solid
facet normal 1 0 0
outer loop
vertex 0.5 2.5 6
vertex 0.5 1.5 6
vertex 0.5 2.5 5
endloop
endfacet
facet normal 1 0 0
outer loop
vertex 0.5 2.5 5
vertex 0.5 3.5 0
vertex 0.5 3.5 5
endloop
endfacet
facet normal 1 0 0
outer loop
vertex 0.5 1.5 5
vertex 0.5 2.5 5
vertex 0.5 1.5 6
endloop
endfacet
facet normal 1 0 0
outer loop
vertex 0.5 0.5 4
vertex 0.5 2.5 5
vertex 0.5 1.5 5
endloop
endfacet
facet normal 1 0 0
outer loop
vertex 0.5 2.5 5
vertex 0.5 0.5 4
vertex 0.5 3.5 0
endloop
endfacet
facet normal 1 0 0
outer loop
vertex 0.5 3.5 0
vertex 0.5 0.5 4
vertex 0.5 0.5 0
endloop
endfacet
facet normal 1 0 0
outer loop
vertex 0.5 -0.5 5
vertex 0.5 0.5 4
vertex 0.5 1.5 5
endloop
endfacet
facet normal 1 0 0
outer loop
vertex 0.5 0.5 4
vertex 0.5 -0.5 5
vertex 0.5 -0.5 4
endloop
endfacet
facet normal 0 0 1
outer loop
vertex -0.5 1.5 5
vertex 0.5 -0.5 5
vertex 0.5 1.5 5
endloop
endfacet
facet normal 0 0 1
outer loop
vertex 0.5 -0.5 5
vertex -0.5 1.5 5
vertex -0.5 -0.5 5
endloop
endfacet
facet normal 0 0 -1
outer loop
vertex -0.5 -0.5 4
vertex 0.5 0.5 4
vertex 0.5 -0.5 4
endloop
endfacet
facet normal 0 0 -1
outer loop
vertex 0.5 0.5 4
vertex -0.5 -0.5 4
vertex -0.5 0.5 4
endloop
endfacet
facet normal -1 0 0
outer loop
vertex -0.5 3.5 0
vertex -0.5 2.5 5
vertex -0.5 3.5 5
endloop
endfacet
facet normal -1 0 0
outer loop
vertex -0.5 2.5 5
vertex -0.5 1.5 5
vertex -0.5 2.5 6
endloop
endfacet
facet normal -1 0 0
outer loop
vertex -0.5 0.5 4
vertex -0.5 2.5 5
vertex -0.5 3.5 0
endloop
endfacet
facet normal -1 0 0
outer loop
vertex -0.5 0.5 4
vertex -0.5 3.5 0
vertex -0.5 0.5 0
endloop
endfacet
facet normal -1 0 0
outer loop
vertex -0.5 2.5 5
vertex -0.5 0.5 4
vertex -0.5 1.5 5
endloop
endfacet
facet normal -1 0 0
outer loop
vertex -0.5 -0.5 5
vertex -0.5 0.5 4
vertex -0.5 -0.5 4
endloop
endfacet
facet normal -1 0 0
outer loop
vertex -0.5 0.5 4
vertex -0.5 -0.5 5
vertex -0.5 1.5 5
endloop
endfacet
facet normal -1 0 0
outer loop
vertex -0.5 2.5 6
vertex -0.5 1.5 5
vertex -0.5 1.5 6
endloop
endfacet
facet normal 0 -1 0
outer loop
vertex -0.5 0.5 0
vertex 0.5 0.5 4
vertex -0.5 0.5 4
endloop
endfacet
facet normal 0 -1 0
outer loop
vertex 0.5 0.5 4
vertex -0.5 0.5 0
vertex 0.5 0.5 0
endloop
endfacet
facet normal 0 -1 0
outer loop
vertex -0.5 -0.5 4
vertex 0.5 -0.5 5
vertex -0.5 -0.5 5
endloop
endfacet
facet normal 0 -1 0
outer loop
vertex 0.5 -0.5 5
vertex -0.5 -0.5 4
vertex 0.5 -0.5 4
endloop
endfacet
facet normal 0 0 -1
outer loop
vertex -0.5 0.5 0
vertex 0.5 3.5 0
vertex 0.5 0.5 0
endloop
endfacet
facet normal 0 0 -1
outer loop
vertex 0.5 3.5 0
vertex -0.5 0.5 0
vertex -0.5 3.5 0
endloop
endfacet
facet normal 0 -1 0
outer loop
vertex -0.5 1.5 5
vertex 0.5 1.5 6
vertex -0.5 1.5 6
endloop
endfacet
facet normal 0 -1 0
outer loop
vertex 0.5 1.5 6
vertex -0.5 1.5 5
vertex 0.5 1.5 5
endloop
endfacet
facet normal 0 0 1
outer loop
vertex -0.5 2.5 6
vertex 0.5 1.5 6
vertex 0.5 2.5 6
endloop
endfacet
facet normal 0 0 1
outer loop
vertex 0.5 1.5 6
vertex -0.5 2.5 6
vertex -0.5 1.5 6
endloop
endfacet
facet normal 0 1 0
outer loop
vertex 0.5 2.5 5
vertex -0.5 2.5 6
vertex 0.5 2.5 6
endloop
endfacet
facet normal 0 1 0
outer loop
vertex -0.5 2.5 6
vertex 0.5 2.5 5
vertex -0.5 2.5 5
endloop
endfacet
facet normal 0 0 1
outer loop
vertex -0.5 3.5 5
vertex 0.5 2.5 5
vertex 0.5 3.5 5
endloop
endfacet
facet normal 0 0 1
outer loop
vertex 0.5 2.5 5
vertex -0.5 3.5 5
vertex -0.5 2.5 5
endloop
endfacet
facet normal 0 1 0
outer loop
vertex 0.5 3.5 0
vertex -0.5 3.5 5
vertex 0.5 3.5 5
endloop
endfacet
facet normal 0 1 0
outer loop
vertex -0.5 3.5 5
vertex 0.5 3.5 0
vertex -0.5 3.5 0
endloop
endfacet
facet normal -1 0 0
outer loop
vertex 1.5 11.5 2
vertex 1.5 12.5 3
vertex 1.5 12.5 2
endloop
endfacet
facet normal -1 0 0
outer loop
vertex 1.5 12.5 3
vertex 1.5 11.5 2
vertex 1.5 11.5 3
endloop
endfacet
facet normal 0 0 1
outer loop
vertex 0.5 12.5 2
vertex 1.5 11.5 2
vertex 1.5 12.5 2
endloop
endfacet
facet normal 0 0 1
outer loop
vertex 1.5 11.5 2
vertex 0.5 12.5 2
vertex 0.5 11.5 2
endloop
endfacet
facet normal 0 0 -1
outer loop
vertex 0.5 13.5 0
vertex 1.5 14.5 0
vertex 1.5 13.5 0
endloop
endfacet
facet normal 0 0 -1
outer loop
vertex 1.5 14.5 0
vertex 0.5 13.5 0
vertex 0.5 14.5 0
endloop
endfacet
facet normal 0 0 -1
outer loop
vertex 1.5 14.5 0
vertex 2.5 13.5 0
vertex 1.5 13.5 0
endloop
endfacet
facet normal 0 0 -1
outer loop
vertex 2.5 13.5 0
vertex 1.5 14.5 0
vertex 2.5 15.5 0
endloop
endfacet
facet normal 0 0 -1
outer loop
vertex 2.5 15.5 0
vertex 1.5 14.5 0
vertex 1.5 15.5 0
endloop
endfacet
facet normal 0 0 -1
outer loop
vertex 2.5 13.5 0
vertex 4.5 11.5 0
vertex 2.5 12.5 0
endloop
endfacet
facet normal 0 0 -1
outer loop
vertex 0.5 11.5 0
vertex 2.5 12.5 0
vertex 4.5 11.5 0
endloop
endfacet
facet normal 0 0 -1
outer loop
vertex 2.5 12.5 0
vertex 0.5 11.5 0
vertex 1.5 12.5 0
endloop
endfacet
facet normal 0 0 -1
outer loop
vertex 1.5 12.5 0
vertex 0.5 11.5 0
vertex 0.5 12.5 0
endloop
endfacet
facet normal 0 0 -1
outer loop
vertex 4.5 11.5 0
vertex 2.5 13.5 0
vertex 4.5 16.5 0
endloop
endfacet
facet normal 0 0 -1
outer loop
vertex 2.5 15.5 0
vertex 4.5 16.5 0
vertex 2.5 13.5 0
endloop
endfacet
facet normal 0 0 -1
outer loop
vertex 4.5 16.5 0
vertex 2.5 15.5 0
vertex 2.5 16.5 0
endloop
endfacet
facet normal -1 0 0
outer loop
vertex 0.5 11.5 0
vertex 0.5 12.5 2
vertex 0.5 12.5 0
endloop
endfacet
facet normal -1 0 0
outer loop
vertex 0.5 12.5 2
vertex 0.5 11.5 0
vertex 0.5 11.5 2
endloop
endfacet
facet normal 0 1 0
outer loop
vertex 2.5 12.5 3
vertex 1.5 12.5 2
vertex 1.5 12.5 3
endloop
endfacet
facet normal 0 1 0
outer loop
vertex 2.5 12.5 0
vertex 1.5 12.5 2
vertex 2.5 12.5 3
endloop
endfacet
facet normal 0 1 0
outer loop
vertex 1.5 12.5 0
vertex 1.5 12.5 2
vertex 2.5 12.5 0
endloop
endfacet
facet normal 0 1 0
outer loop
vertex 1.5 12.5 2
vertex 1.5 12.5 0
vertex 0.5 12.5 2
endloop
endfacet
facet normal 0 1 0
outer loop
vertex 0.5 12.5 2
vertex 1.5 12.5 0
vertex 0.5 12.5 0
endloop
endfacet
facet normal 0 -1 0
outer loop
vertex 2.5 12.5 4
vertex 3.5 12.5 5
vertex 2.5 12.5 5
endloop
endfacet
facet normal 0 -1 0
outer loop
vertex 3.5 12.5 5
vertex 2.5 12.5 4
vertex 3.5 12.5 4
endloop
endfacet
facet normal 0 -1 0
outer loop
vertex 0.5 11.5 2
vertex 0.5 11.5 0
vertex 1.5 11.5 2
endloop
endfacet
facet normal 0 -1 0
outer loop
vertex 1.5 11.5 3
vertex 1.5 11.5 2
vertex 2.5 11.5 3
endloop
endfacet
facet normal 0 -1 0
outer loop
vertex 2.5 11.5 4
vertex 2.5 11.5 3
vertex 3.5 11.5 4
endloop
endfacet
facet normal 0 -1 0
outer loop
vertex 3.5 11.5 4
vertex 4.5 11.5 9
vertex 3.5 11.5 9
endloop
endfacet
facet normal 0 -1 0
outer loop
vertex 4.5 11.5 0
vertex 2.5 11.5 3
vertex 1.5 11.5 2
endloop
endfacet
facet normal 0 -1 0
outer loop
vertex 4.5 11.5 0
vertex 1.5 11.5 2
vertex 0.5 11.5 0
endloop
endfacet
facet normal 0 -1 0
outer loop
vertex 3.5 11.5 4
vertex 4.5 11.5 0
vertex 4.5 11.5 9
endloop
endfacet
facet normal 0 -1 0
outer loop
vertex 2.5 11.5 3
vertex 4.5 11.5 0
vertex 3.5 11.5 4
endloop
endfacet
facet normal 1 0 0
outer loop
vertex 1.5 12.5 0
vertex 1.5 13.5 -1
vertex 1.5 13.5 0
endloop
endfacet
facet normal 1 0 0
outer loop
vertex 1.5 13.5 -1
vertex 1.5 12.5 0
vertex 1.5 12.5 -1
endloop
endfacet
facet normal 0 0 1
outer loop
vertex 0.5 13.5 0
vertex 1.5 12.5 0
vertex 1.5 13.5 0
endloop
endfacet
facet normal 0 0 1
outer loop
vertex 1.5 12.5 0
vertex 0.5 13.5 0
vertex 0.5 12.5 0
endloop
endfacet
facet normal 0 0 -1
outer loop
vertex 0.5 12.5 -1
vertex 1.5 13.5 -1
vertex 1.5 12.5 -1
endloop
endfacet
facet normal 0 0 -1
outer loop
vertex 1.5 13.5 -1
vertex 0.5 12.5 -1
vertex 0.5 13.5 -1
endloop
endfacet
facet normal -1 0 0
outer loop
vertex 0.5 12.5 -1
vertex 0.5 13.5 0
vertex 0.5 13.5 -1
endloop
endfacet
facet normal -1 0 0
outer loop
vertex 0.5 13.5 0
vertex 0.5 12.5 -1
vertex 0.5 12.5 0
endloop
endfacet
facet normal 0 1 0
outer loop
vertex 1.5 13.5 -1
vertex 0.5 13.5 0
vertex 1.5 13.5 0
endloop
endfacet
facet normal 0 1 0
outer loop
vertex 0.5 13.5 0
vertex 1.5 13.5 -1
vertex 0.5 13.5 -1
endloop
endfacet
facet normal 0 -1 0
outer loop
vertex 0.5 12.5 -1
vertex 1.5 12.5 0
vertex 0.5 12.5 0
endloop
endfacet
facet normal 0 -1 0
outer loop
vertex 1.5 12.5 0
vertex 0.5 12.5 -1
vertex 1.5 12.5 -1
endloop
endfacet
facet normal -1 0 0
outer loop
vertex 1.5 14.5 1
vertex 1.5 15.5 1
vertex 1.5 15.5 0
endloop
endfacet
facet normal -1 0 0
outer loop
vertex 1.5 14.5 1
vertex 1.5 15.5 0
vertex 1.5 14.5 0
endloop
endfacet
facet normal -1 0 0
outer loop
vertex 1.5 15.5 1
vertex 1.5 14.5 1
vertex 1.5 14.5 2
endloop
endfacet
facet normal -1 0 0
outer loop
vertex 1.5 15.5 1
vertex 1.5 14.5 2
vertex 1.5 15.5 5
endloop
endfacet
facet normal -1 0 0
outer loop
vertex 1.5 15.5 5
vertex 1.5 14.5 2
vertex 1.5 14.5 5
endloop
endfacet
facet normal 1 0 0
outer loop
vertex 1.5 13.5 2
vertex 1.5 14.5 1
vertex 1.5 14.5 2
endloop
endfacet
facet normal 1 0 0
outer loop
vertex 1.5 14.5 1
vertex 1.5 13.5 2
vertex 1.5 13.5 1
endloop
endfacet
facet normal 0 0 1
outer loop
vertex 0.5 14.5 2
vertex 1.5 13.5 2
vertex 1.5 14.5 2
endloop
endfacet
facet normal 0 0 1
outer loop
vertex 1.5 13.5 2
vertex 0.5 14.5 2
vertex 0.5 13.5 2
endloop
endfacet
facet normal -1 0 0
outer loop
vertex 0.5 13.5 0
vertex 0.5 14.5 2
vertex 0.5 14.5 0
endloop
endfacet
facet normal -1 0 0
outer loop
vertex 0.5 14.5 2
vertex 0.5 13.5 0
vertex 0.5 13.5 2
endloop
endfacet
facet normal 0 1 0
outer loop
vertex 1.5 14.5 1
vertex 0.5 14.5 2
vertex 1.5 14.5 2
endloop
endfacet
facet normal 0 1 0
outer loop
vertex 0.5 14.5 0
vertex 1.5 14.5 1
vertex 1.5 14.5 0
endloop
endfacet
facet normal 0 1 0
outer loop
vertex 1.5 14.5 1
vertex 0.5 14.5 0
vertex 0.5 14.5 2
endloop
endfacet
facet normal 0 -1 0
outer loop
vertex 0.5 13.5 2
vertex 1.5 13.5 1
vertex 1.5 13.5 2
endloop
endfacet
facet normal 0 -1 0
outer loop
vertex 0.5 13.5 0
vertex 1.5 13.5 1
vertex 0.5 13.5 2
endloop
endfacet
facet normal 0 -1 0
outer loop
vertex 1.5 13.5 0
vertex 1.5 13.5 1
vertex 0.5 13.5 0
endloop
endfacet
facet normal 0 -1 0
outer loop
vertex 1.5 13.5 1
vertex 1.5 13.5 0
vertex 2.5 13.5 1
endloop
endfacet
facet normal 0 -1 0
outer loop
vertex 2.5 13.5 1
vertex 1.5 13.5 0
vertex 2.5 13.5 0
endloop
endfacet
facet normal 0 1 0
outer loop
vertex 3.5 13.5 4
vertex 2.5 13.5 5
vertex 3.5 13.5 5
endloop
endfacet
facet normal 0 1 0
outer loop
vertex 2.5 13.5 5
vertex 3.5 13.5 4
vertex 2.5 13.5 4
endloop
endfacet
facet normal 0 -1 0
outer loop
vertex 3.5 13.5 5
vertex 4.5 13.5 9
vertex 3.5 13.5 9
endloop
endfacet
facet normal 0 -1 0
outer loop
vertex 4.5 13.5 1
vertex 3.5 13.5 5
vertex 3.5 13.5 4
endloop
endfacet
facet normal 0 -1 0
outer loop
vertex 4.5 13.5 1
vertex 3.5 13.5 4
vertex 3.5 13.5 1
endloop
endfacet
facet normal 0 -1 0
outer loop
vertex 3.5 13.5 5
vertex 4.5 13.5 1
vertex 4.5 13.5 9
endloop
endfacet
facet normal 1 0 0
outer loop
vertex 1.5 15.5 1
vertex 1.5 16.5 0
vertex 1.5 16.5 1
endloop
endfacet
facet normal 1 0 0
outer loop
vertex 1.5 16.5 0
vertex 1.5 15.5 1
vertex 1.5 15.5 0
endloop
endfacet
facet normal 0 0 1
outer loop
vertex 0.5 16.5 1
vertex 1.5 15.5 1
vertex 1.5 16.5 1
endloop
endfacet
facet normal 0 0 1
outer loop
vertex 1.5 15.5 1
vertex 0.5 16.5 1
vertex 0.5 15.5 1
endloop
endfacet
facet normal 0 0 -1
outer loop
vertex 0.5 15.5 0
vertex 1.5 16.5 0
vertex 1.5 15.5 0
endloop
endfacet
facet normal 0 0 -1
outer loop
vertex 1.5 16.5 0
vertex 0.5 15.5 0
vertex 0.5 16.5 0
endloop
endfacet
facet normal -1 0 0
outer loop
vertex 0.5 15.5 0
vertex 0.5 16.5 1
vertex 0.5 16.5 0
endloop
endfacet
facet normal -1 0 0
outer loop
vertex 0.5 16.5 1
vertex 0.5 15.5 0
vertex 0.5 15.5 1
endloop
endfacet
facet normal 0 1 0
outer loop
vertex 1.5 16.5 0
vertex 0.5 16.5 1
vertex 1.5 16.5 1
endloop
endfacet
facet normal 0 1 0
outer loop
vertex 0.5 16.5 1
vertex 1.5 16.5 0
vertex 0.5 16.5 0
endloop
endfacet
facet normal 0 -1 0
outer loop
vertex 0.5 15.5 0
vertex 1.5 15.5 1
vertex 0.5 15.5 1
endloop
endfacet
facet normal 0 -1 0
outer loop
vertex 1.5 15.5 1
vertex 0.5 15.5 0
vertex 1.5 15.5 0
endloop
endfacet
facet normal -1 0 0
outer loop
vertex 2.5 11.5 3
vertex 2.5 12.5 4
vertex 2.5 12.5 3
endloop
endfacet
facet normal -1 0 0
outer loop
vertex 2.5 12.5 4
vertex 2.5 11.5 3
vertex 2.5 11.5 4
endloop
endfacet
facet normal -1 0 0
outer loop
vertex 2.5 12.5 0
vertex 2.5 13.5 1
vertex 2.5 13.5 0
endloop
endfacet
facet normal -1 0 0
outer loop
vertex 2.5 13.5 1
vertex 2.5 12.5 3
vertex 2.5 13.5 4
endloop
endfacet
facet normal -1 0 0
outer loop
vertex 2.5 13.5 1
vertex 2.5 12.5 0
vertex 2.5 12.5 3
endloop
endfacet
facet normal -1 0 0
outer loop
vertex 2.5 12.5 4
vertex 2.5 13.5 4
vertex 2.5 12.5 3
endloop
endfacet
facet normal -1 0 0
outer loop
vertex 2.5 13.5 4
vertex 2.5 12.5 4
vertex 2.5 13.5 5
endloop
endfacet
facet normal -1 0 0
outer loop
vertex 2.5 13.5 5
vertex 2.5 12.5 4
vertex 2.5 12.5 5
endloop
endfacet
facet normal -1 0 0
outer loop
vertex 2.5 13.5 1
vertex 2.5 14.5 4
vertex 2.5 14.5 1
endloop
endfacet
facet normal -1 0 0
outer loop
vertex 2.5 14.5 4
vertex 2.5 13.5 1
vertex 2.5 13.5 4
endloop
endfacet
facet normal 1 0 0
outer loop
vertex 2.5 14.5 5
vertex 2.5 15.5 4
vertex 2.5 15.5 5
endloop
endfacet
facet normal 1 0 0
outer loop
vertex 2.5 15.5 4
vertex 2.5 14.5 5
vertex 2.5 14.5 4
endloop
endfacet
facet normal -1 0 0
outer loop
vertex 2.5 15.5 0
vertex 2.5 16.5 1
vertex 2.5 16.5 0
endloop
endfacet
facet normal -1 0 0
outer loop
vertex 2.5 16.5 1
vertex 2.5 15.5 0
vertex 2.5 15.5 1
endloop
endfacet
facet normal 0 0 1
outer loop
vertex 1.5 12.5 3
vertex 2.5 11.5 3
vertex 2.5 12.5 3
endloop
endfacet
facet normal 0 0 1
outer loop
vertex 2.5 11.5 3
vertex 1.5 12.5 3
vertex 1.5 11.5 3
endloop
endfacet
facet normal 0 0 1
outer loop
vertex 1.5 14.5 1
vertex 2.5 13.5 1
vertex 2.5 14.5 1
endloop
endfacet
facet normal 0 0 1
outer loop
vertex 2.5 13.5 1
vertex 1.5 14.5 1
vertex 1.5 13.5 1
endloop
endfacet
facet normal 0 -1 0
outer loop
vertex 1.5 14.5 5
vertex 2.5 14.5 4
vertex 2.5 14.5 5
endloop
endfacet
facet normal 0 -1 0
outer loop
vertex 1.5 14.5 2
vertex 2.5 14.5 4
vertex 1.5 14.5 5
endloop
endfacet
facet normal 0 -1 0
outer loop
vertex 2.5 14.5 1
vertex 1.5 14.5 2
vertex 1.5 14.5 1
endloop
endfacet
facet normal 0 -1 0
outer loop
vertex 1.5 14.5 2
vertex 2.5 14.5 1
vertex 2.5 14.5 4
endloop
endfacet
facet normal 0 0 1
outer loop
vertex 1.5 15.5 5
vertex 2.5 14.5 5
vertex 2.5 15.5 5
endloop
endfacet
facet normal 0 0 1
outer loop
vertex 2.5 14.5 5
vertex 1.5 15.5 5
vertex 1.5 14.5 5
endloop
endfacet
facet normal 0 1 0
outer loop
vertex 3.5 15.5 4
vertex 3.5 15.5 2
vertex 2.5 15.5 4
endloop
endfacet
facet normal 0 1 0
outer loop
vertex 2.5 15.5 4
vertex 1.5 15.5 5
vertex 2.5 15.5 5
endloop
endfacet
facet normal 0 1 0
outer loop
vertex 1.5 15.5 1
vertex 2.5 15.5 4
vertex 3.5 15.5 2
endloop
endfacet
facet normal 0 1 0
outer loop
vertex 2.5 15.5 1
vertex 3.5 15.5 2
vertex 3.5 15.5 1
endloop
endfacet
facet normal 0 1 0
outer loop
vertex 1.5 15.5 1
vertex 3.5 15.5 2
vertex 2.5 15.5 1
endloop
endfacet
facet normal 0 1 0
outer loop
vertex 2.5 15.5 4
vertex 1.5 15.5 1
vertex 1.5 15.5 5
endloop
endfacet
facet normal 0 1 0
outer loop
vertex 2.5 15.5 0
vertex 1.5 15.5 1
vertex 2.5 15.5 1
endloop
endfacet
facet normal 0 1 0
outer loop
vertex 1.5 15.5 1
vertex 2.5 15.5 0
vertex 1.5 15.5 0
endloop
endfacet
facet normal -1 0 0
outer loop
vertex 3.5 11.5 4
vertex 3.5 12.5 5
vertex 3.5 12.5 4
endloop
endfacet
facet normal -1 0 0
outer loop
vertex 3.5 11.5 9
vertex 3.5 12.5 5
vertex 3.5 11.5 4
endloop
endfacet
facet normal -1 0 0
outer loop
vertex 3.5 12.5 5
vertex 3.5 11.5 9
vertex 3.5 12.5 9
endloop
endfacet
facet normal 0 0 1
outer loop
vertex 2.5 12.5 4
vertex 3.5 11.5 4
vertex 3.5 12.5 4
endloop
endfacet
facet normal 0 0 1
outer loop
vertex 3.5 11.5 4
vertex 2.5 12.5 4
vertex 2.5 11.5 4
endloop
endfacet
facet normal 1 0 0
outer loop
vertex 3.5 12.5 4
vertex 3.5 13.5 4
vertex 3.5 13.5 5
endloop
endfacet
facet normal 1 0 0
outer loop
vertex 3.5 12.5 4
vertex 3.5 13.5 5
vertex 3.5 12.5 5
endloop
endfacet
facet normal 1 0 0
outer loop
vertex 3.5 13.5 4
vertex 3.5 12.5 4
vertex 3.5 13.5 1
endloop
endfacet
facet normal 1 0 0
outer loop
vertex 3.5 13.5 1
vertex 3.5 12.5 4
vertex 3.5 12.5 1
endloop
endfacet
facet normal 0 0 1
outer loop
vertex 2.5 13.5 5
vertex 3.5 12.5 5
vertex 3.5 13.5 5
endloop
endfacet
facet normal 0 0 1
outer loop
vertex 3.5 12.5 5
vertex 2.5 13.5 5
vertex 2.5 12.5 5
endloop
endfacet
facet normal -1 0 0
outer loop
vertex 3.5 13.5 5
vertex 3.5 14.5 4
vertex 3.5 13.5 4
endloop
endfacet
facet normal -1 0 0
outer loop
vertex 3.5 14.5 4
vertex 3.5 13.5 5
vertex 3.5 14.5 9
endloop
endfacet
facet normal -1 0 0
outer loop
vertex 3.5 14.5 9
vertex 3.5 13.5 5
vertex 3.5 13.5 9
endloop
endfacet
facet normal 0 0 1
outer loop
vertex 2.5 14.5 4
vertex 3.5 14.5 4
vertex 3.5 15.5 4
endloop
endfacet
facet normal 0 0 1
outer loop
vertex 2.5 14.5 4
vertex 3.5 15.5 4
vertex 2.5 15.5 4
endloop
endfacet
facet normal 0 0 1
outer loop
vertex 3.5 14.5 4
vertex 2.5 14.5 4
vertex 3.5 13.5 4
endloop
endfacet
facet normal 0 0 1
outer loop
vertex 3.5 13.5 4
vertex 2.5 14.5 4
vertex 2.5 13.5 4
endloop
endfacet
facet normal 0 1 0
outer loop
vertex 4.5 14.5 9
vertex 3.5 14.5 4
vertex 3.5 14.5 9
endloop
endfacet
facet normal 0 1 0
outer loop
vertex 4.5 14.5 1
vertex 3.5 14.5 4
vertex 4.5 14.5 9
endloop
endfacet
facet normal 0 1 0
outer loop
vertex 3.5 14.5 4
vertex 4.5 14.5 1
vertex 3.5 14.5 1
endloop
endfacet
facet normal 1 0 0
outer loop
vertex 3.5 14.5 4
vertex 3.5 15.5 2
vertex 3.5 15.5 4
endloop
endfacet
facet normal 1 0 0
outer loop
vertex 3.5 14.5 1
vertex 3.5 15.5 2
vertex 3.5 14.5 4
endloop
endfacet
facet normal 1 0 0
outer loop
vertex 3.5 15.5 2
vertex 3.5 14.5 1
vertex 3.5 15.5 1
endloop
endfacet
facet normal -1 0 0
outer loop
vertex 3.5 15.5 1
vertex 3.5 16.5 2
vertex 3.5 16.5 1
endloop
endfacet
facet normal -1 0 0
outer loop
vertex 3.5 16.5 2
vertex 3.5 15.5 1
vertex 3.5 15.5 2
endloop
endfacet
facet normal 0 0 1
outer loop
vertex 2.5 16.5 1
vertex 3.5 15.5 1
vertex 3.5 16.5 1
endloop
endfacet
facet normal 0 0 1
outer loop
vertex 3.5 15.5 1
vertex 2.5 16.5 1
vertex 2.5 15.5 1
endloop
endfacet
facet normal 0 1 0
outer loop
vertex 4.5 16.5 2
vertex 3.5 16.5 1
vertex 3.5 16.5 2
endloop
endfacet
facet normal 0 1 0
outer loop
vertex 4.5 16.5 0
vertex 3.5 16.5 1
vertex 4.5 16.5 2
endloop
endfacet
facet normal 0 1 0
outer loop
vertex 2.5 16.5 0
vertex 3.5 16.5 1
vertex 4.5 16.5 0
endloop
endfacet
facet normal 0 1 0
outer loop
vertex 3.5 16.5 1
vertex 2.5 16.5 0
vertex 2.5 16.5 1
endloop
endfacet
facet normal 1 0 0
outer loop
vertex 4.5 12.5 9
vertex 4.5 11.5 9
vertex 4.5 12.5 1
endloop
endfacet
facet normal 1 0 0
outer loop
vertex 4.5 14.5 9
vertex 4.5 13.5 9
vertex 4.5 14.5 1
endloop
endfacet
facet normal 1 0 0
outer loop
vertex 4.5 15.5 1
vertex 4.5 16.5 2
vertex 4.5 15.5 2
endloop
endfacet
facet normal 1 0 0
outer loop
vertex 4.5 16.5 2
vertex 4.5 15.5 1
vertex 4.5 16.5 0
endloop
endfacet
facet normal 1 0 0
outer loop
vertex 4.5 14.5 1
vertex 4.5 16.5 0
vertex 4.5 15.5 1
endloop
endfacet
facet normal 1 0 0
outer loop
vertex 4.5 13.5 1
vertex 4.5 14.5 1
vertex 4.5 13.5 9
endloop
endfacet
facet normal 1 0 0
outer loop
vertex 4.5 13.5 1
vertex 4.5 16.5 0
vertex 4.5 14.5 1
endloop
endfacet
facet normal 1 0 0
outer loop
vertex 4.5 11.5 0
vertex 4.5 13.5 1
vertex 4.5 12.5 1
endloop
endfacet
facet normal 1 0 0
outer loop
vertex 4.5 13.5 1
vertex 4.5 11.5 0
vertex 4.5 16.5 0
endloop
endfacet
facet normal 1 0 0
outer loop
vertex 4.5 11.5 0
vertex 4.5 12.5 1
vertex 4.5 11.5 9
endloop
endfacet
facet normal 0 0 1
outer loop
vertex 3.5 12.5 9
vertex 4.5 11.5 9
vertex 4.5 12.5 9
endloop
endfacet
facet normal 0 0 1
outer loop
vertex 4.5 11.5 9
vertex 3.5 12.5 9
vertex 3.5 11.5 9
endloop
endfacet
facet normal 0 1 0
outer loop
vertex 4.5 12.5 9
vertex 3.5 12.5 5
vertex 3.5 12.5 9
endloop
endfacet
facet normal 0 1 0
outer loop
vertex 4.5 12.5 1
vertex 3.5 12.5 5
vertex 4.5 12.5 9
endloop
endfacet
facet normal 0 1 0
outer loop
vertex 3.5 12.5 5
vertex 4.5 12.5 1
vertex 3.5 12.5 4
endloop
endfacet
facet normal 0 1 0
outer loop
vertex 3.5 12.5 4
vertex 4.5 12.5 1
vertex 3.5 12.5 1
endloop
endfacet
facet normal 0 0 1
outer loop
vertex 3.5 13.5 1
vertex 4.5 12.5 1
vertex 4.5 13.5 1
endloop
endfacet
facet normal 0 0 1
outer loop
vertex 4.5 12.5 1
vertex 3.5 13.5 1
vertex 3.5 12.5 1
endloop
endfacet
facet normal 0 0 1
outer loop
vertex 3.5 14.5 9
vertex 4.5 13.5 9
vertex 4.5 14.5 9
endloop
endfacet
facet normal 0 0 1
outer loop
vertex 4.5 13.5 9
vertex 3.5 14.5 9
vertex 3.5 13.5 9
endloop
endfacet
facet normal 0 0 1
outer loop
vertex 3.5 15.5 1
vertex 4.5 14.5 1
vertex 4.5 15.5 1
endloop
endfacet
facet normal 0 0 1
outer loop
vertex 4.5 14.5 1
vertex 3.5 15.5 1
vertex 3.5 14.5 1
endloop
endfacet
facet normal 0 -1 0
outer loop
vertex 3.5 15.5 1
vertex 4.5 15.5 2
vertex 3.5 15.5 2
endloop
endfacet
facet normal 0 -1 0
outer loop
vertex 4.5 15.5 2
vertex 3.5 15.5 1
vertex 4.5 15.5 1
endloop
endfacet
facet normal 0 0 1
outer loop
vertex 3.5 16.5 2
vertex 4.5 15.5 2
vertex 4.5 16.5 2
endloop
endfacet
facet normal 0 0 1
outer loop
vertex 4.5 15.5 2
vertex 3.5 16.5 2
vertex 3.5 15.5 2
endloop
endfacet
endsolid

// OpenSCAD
union() {
    translate([0, 0, 4.5]) color([1, 0, 0]) cube([1, 1, 1], center=true);
    translate([0, 1, 2.5]) cube([1, 1, 5], center=true);
    translate([0, 2, 3.0]) cube([1, 1, 6], center=true);
    translate([0, 3, 2.5]) cube([1, 1, 5], center=true);
    translate([1, 12, 1.0]) cube([1, 1, 2], center=true);
    translate([1, 13, -0.5]) color([0, 0, 1]) cube([1, 1, 1], center=true);
    translate([1, 14, 1.0]) cube([1, 1, 2], center=true);
    translate([1, 16, 0.5]) cube([1, 1, 1], center=true);
    translate([2, 12, 1.5]) cube([1, 1, 3], center=true);
    translate([2, 14, 0.5]) cube([1, 1, 1], center=true);
    translate([2, 15, 2.5]) cube([1, 1, 5], center=true);
    translate([3, 12, 2.0]) cube([1, 1, 4], center=true);
    translate([3, 13, 2.5]) cube([1, 1, 5], center=true);
    translate([3, 14, 2.0]) cube([1, 1, 4], center=true);
    translate([3, 15, 2.0]) cube([1, 1, 4], center=true);
    translate([3, 16, 0.5]) cube([1, 1, 1], center=true);
    translate([4, 12, 4.5]) cube([1, 1, 9], center=true);
    translate([4, 13, 0.5]) cube([1, 1, 1], center=true);
    translate([4, 14, 4.5]) cube([1, 1, 9], center=true);
    translate([4, 15, 0.5]) cube([1, 1, 1], center=true);
    translate([4, 16, 1.0]) cube([1, 1, 2], center=true);
}
